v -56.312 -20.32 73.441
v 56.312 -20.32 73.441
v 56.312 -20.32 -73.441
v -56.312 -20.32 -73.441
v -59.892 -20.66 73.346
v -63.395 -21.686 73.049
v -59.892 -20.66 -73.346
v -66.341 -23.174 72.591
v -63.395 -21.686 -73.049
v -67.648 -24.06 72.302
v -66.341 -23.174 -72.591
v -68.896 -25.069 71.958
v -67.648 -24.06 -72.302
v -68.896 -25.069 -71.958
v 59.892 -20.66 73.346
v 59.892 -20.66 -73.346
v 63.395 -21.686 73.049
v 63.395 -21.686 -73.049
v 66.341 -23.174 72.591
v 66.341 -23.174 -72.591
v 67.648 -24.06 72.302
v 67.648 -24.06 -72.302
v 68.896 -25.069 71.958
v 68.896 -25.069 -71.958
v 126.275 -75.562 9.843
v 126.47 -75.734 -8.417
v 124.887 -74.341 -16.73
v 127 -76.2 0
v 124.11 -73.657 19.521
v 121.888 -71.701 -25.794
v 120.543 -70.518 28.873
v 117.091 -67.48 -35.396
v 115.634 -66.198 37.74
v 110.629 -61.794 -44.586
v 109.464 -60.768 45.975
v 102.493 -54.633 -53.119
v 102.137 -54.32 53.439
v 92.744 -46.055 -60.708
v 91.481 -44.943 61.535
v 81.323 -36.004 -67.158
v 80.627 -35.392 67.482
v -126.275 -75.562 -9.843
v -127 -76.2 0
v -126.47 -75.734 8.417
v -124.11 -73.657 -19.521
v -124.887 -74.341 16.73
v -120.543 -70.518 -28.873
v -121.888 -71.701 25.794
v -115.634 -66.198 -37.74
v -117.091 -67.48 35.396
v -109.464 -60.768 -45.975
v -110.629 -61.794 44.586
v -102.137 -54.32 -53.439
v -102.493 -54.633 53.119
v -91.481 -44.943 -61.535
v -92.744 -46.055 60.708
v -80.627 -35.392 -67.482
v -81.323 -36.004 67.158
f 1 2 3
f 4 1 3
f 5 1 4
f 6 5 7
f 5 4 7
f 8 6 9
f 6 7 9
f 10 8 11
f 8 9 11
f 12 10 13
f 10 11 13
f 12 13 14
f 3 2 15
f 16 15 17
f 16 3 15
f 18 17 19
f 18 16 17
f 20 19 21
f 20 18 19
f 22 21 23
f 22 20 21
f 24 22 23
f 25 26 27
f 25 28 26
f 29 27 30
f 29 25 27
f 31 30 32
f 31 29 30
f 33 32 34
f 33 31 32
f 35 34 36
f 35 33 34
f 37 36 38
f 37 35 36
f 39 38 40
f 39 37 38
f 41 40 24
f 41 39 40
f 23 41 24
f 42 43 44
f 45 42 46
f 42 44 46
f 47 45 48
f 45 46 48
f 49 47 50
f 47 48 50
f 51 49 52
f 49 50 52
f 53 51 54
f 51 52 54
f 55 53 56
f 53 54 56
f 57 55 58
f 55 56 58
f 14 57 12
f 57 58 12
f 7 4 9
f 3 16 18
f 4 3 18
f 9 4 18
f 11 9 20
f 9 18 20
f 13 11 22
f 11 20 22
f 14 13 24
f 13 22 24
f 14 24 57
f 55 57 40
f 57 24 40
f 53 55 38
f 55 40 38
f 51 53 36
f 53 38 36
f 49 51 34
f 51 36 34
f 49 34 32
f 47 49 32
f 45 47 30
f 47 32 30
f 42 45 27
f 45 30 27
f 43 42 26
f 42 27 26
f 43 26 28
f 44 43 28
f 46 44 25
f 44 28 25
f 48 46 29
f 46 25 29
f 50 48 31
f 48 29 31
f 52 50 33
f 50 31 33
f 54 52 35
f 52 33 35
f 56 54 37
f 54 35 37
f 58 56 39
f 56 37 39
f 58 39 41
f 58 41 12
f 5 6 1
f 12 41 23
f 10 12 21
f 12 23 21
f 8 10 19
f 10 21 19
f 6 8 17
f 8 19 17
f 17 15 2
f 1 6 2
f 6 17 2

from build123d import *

# Parameters (mm, degrees)
BOSS_EXTRUDE1_DEPTH = 127
CUT_EXTRUDE3_DEPTH  = 166.314783368
FILLET3_R           = 19.05


with BuildPart() as part:
    # Sketch1 → Boss-Extrude1 (new, symmetric)
    with BuildSketch(Plane(origin=(0, 0, 0), x_dir=(0, 0, -1), z_dir=(1, 0, 0))):
        with BuildLine():
            Line((-73.440708058, -20.32), (73.440708058, -20.32))
            ThreePointArc((73.440708058, -20.32), (0, -76.2), (-73.440708058, -20.32))
        make_face()
    extrude(amount=BOSS_EXTRUDE1_DEPTH, both=True)

    # Sketch7 → Cut-Extrude3 (cut, symmetric)
    with BuildSketch(Plane.XY):
        Polygon((-63.5, -20.32), (-127, -20.32), (-127, -76.2), align=None)
    cut_extrude3 = extrude(amount=CUT_EXTRUDE3_DEPTH, both=True, mode=Mode.SUBTRACT)

    # Mirror4: Cut-Extrude3 across plane
    add(cut_extrude3.mirror(Plane(origin=(0, 0, 0), x_dir=(0, 0, 1), z_dir=(1, 0, 0))), mode=Mode.SUBTRACT)

    # Fillet3
    fillet3_edges = [part.edges().sort_by_distance(p)[0] for p in [
        (63.5, -20.32, 0),
        (-63.5, -20.32, 0),
    ]]
    fillet(fillet3_edges, radius=FILLET3_R)


with BuildPart() as body_2:
    # Split1: the piece on the far side of the plane
    add(part.part)
    split(bisect_by=Plane(origin=(0, 0, 0), x_dir=(0, 0, 1), z_dir=(1, 0, 0)), keep=Keep.BOTTOM)


with BuildPart() as part_1:
    add(part.part)

    # Split1
    split(bisect_by=Plane(origin=(0, 0, 0), x_dir=(0, 0, 1), z_dir=(1, 0, 0)), keep=Keep.TOP)


with BuildPart() as body_2_1:
    add(body_2.part)

    # Combine1: union part
    add(part_1.part)


solid = body_2_1.part
